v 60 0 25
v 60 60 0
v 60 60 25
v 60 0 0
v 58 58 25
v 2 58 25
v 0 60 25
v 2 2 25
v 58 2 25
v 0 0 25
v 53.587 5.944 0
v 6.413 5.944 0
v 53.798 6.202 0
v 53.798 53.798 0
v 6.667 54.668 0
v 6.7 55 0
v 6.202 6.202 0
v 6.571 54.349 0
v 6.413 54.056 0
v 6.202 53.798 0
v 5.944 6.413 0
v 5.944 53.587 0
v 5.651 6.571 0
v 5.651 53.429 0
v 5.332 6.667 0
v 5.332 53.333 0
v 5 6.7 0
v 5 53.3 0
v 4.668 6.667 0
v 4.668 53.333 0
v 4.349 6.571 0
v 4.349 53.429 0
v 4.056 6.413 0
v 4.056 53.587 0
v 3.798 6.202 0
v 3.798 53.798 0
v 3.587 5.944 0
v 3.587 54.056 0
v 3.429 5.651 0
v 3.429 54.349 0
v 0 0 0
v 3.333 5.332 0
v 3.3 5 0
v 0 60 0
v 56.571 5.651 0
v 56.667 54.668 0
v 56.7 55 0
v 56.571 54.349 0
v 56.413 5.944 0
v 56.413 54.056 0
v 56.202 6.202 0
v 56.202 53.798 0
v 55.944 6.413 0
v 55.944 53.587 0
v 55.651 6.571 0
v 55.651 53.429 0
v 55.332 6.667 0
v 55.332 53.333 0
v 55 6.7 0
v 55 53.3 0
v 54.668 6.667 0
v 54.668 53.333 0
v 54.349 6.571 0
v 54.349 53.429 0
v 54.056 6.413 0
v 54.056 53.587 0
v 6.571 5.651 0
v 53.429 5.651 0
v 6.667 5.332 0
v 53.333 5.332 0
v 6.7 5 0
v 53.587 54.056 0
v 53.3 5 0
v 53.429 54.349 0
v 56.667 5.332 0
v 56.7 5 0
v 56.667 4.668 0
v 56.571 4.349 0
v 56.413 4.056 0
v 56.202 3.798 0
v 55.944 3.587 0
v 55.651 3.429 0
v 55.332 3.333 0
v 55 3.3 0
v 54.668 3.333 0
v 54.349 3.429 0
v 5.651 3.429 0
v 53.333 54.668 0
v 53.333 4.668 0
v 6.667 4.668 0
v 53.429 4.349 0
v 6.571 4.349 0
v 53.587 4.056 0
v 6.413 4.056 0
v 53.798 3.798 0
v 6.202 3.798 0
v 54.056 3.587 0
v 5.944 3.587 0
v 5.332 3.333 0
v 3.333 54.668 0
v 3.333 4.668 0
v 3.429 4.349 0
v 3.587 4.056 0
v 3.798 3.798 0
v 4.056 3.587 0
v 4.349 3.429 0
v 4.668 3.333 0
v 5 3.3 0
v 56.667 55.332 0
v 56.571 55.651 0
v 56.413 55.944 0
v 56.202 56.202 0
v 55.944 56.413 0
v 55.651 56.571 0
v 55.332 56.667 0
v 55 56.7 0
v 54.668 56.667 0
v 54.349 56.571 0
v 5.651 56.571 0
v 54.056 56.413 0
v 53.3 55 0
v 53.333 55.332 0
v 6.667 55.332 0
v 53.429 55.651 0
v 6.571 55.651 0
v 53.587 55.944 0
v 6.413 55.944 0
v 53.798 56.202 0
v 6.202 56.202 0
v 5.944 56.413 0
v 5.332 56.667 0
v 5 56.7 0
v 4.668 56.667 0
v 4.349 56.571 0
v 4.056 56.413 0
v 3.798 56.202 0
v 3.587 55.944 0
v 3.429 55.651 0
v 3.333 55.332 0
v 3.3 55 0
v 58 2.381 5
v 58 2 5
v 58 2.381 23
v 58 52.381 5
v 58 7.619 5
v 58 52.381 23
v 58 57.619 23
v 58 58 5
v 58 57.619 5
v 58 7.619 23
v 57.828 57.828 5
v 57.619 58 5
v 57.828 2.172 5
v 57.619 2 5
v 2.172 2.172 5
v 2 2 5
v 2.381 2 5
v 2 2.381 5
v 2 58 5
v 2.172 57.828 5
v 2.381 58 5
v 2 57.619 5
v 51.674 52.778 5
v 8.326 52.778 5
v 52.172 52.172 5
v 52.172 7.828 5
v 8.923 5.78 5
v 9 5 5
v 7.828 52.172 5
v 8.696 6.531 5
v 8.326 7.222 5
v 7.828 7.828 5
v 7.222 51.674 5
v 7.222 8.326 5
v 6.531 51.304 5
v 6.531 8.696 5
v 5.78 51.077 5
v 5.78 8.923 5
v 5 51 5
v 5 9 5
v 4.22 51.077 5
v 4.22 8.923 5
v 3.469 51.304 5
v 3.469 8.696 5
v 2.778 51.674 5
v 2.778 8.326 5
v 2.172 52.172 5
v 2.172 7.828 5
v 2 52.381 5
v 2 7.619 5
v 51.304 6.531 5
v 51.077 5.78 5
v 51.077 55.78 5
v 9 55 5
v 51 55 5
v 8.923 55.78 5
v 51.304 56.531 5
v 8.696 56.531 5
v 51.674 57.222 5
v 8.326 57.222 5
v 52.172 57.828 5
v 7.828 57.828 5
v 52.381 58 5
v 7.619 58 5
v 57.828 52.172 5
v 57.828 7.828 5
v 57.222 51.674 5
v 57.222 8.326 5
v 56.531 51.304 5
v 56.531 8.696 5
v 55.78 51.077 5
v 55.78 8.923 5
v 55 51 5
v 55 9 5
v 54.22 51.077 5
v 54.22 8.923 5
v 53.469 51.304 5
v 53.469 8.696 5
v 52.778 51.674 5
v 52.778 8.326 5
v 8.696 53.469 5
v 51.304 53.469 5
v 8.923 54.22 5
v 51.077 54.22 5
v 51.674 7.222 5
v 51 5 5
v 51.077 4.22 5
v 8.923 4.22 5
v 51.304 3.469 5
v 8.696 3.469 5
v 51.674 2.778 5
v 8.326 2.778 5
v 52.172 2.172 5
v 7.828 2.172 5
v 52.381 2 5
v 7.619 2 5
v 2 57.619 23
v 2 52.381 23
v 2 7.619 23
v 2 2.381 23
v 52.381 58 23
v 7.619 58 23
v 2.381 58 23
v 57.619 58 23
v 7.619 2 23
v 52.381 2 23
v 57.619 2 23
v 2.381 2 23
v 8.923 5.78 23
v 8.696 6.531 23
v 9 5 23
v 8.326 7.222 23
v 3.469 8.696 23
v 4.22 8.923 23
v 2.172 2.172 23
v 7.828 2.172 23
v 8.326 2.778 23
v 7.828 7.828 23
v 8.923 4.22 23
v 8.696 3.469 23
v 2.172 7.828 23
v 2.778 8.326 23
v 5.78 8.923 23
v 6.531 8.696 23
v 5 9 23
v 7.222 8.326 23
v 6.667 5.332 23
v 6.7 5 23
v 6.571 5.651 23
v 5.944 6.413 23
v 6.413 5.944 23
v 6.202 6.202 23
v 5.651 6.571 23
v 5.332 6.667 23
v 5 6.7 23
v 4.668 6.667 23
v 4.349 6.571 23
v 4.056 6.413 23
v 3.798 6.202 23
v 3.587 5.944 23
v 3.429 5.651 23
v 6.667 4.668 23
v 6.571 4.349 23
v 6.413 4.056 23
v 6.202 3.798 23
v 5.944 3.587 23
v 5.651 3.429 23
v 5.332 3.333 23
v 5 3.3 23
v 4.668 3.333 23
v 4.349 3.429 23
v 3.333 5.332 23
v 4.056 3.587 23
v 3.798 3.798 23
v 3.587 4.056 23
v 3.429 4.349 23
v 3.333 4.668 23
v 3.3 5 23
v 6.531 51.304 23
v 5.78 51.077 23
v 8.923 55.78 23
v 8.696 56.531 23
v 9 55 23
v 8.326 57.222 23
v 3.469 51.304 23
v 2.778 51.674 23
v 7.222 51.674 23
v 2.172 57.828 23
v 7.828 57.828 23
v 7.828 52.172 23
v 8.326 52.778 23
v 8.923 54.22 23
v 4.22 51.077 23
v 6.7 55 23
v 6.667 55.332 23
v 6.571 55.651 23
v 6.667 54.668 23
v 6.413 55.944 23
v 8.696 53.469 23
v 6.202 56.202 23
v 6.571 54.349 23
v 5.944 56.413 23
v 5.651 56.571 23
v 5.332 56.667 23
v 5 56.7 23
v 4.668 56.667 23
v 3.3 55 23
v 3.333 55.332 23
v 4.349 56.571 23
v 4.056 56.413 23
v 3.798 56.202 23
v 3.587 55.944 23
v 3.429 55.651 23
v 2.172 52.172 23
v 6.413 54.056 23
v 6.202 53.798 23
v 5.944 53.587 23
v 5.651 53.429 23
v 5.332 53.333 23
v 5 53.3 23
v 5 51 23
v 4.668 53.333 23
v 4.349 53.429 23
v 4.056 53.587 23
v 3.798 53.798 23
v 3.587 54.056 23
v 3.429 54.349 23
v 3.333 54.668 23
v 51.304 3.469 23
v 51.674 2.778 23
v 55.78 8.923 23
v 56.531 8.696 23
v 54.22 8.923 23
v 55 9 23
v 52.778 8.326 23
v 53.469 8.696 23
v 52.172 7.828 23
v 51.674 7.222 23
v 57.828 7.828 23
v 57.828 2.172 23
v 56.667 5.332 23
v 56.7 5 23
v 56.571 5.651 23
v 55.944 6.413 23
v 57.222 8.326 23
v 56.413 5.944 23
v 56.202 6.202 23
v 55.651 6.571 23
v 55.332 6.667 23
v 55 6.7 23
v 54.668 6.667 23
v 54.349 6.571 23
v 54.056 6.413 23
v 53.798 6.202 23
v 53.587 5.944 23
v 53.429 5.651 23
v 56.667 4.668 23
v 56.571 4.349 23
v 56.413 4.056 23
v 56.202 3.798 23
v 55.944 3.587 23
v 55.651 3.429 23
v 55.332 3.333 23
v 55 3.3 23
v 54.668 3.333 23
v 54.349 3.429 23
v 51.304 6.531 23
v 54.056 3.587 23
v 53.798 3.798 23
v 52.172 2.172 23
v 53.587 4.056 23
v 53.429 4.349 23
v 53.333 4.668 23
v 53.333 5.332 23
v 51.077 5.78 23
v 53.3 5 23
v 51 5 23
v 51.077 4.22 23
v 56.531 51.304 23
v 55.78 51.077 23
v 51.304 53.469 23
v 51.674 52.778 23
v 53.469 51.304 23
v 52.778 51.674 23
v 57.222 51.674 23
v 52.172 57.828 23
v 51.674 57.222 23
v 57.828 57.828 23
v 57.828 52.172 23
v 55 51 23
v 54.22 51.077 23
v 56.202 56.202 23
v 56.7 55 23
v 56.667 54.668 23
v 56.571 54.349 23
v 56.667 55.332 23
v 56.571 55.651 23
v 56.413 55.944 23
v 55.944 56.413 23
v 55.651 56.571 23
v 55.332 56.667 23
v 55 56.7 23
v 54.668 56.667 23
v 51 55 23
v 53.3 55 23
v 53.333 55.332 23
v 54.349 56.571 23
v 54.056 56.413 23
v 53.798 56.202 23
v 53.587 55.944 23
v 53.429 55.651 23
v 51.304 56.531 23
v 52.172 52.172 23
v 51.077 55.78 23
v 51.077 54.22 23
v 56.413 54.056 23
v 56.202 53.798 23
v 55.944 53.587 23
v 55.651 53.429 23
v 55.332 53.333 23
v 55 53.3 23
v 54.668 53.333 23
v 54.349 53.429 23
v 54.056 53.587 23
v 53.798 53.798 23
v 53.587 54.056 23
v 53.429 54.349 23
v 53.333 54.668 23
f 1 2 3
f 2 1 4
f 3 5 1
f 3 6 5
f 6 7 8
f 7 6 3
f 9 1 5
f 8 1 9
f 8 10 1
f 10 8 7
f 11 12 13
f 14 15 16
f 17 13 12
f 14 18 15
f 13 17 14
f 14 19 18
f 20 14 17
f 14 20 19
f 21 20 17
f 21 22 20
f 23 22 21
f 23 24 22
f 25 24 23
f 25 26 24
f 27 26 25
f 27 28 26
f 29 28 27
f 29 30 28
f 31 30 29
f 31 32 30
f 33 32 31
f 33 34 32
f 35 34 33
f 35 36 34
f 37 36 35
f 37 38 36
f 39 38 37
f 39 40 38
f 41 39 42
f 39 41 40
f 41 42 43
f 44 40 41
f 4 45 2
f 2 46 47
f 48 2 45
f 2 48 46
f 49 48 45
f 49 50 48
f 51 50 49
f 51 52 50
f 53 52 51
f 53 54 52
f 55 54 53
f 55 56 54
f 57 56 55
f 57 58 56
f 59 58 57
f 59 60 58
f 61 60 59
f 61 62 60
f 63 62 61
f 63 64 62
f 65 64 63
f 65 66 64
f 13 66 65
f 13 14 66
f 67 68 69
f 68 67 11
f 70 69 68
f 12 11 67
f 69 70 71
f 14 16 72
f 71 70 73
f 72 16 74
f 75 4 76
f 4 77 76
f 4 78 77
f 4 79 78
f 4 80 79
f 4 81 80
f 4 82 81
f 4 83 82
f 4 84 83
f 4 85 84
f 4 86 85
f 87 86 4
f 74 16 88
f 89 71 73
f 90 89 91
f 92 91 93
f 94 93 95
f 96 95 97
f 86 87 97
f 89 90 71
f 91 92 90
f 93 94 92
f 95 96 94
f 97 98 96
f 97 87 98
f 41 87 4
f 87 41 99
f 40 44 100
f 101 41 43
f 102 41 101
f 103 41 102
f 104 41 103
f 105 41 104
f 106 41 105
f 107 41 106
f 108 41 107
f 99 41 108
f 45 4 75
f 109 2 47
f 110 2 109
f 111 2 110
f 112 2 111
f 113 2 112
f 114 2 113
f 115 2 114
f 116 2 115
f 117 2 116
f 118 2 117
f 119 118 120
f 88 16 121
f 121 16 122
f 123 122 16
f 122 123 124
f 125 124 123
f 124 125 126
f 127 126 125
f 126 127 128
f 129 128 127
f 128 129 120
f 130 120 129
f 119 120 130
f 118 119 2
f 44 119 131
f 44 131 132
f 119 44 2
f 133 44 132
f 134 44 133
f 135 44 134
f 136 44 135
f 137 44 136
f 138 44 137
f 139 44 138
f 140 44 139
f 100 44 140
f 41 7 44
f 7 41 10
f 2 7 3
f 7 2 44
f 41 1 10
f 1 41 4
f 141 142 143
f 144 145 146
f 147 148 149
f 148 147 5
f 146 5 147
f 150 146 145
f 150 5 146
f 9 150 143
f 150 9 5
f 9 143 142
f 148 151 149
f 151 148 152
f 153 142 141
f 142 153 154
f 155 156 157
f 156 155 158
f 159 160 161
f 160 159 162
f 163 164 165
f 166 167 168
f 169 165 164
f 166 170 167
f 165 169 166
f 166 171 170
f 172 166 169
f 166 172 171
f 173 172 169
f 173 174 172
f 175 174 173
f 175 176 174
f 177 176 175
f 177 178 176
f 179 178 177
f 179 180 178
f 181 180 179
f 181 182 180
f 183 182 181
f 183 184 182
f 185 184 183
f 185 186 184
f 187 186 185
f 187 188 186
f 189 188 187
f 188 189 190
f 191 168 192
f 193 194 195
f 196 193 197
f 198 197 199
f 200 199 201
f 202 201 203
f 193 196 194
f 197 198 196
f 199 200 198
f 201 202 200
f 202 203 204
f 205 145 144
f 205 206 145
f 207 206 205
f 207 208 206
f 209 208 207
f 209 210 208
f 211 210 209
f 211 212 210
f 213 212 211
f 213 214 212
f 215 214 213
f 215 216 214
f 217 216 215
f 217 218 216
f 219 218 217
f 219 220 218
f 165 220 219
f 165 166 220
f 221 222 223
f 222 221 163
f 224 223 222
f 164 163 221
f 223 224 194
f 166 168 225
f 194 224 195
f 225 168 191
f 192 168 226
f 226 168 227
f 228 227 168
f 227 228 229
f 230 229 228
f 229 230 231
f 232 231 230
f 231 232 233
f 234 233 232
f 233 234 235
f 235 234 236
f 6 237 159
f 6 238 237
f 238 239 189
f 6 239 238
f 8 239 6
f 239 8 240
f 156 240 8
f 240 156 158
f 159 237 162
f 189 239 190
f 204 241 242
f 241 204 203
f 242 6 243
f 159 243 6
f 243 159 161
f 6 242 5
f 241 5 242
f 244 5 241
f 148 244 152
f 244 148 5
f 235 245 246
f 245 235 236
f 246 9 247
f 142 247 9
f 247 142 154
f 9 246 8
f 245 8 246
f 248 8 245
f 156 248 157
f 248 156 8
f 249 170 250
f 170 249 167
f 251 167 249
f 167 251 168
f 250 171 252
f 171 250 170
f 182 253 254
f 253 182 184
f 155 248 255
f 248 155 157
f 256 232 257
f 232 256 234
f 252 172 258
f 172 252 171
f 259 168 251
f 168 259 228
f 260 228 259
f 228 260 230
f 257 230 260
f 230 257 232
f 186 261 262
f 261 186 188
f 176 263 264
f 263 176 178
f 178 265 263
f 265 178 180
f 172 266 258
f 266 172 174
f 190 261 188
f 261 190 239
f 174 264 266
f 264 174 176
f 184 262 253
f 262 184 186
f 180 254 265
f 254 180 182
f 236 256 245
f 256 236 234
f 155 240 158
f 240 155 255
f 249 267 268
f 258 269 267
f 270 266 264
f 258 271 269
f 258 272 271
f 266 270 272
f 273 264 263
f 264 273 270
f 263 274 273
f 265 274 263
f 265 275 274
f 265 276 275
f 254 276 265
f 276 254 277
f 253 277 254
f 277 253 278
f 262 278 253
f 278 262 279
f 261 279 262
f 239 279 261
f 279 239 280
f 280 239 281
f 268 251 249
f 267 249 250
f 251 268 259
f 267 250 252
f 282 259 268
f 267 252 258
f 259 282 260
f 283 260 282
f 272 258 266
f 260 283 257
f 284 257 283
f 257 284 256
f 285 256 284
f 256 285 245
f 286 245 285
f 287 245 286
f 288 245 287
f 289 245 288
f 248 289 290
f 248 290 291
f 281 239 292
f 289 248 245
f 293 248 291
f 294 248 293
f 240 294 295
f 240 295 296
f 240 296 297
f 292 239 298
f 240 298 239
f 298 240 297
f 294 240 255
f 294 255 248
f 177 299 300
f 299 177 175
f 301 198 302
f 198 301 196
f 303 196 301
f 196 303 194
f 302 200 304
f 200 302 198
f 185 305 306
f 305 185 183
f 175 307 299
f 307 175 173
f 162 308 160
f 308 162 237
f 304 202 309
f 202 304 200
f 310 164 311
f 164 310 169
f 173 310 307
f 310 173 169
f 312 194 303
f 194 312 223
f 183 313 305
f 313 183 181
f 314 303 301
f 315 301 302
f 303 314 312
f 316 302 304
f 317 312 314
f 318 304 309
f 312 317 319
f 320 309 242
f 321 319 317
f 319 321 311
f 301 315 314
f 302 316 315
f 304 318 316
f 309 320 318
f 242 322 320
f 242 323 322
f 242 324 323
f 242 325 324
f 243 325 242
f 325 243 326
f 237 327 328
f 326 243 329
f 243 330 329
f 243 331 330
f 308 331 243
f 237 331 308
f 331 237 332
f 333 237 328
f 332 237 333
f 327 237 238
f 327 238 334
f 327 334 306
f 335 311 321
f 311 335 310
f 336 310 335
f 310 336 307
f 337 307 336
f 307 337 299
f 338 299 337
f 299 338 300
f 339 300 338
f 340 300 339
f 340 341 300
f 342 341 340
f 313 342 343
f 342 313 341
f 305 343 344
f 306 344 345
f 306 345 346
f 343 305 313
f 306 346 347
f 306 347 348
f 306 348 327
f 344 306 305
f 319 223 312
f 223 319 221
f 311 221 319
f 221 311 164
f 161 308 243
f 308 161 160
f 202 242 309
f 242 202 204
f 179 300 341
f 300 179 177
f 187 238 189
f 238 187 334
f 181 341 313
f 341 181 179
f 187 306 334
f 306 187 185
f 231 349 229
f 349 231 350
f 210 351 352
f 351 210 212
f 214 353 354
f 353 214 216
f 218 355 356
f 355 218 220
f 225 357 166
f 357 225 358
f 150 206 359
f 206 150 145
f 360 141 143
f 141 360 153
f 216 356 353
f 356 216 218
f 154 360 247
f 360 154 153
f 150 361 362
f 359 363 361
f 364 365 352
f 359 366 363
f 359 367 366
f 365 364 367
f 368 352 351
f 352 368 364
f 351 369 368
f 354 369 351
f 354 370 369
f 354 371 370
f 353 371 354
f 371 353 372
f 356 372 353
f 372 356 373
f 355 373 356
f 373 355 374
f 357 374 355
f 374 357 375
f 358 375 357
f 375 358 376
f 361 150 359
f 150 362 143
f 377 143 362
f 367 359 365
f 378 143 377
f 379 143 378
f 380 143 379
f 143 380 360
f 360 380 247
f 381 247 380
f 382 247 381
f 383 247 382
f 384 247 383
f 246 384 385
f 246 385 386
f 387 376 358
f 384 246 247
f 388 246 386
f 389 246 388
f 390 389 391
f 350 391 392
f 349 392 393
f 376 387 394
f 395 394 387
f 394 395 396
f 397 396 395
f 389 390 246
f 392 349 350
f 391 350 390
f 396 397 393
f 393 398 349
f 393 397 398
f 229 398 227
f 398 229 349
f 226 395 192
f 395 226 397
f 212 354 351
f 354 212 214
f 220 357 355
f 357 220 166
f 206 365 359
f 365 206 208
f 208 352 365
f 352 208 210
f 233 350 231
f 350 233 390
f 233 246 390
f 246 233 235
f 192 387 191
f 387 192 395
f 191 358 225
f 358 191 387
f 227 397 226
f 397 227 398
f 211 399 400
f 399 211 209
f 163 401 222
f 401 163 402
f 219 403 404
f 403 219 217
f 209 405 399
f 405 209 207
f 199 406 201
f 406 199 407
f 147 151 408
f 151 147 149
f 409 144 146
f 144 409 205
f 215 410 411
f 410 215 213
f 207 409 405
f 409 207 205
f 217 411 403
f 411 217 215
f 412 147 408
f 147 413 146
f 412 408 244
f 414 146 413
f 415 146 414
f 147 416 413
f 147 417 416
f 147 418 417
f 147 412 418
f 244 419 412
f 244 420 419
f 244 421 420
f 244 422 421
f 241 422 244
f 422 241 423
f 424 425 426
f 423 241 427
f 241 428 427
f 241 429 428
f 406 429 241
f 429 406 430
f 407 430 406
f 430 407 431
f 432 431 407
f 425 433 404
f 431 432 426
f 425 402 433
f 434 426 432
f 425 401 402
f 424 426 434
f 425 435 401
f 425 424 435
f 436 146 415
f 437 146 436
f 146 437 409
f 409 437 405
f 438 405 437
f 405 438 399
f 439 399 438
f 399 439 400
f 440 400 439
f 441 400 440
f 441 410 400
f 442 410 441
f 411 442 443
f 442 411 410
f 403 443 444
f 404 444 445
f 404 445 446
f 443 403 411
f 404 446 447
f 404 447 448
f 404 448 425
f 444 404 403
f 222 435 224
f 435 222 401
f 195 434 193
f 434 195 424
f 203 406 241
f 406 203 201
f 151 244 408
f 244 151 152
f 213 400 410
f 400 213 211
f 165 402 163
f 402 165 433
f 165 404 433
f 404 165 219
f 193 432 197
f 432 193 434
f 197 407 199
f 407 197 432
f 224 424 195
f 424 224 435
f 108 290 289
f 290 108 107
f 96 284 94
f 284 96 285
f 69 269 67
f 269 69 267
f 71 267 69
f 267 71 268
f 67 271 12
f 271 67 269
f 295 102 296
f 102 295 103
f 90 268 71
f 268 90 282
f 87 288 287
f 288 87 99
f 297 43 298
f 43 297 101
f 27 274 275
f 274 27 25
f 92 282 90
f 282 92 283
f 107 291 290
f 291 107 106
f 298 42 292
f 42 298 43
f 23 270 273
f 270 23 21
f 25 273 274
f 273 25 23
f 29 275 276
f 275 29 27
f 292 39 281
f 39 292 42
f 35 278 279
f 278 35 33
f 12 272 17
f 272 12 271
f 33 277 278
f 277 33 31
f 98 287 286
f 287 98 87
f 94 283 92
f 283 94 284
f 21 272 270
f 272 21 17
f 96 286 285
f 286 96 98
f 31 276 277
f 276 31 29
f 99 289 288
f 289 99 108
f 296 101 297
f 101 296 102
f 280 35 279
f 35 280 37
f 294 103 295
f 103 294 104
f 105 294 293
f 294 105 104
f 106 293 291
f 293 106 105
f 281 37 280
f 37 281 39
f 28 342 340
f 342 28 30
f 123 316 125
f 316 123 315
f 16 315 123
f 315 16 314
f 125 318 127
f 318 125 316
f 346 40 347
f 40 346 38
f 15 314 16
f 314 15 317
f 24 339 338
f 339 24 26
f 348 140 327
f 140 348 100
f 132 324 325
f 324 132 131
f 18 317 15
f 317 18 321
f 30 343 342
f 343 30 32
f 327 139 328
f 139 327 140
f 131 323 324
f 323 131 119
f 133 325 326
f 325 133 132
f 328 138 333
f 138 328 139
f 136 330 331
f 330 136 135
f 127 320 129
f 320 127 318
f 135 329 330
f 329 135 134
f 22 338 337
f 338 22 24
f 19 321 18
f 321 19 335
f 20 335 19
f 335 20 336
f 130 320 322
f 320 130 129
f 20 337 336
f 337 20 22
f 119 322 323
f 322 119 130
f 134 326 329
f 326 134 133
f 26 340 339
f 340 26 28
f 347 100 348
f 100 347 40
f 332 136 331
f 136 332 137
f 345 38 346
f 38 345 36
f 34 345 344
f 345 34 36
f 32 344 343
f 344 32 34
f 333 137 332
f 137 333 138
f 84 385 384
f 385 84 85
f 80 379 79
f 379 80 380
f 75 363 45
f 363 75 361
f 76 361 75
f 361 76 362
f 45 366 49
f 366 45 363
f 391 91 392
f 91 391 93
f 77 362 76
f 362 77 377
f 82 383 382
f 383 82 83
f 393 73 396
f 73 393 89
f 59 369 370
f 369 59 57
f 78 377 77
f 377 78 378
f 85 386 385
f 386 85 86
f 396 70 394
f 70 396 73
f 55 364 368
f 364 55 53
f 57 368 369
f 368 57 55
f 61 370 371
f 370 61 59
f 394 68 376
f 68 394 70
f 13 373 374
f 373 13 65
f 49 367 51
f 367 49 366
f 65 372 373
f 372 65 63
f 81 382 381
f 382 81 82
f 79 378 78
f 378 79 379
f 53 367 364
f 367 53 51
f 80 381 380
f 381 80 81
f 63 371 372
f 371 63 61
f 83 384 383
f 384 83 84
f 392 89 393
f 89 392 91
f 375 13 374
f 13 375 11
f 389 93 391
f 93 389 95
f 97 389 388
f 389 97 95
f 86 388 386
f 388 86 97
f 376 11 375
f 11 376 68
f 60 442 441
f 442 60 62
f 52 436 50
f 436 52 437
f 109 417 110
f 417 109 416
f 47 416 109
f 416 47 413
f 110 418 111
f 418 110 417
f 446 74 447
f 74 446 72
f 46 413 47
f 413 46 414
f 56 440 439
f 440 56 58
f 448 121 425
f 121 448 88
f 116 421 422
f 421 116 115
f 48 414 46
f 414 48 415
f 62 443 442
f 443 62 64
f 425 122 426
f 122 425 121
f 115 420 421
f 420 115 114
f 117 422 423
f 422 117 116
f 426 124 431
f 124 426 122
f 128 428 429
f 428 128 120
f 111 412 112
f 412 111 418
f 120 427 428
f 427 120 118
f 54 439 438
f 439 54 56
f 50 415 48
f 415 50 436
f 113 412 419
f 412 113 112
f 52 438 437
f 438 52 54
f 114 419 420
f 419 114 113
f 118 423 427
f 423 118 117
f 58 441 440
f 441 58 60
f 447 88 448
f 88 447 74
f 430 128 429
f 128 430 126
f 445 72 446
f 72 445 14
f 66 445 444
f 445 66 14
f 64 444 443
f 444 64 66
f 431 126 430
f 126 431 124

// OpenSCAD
$fn = 32;

// ----------------------------------------------------------------------
// Enclosure body: 60 x 60 x 25 mm, wall 2 mm
// ----------------------------------------------------------------------

// --- parameters (mm) ---
length = 60;              // outside length, X
width = 60;               // outside width, Y
height = 25;              // outside height, Z
wall = 2;                 // side wall thickness
floor_t = 5;              // floor thickness
boss_d = 8;               // corner boss diameter
boss_h = 18;              // corner boss height above the floor
boss_hole_d = 3.4;        // lid screw clearance in the boss
boss_lip = 5;             // boss centre inset from the corner

module shell() {
  difference() {
    cube([length, width, height]);
    /* hollow, open at the top */
    translate([wall, wall, floor_t])
      cube([length - 2 * wall, width - 2 * wall, height]);
  }
}

module bosses() {
  /* corner bosses, sunk 1 mm into the floor */
  for (sx = [0, 1]) for (sy = [0, 1])
    translate([sx * (length - 2 * boss_lip) + boss_lip, sy * (width - 2 * boss_lip) + boss_lip, floor_t - 1])
      cylinder(h = boss_h + 1, d = boss_d);
}

difference() {
  union() {
    shell();
    bosses();
  }
  /* boss screw holes */
  for (sx = [0, 1]) for (sy = [0, 1])
    translate([sx * (length - 2 * boss_lip) + boss_lip, sy * (width - 2 * boss_lip) + boss_lip, -1]) cylinder(h = floor_t + boss_h + 2, d = boss_hole_d);
}
